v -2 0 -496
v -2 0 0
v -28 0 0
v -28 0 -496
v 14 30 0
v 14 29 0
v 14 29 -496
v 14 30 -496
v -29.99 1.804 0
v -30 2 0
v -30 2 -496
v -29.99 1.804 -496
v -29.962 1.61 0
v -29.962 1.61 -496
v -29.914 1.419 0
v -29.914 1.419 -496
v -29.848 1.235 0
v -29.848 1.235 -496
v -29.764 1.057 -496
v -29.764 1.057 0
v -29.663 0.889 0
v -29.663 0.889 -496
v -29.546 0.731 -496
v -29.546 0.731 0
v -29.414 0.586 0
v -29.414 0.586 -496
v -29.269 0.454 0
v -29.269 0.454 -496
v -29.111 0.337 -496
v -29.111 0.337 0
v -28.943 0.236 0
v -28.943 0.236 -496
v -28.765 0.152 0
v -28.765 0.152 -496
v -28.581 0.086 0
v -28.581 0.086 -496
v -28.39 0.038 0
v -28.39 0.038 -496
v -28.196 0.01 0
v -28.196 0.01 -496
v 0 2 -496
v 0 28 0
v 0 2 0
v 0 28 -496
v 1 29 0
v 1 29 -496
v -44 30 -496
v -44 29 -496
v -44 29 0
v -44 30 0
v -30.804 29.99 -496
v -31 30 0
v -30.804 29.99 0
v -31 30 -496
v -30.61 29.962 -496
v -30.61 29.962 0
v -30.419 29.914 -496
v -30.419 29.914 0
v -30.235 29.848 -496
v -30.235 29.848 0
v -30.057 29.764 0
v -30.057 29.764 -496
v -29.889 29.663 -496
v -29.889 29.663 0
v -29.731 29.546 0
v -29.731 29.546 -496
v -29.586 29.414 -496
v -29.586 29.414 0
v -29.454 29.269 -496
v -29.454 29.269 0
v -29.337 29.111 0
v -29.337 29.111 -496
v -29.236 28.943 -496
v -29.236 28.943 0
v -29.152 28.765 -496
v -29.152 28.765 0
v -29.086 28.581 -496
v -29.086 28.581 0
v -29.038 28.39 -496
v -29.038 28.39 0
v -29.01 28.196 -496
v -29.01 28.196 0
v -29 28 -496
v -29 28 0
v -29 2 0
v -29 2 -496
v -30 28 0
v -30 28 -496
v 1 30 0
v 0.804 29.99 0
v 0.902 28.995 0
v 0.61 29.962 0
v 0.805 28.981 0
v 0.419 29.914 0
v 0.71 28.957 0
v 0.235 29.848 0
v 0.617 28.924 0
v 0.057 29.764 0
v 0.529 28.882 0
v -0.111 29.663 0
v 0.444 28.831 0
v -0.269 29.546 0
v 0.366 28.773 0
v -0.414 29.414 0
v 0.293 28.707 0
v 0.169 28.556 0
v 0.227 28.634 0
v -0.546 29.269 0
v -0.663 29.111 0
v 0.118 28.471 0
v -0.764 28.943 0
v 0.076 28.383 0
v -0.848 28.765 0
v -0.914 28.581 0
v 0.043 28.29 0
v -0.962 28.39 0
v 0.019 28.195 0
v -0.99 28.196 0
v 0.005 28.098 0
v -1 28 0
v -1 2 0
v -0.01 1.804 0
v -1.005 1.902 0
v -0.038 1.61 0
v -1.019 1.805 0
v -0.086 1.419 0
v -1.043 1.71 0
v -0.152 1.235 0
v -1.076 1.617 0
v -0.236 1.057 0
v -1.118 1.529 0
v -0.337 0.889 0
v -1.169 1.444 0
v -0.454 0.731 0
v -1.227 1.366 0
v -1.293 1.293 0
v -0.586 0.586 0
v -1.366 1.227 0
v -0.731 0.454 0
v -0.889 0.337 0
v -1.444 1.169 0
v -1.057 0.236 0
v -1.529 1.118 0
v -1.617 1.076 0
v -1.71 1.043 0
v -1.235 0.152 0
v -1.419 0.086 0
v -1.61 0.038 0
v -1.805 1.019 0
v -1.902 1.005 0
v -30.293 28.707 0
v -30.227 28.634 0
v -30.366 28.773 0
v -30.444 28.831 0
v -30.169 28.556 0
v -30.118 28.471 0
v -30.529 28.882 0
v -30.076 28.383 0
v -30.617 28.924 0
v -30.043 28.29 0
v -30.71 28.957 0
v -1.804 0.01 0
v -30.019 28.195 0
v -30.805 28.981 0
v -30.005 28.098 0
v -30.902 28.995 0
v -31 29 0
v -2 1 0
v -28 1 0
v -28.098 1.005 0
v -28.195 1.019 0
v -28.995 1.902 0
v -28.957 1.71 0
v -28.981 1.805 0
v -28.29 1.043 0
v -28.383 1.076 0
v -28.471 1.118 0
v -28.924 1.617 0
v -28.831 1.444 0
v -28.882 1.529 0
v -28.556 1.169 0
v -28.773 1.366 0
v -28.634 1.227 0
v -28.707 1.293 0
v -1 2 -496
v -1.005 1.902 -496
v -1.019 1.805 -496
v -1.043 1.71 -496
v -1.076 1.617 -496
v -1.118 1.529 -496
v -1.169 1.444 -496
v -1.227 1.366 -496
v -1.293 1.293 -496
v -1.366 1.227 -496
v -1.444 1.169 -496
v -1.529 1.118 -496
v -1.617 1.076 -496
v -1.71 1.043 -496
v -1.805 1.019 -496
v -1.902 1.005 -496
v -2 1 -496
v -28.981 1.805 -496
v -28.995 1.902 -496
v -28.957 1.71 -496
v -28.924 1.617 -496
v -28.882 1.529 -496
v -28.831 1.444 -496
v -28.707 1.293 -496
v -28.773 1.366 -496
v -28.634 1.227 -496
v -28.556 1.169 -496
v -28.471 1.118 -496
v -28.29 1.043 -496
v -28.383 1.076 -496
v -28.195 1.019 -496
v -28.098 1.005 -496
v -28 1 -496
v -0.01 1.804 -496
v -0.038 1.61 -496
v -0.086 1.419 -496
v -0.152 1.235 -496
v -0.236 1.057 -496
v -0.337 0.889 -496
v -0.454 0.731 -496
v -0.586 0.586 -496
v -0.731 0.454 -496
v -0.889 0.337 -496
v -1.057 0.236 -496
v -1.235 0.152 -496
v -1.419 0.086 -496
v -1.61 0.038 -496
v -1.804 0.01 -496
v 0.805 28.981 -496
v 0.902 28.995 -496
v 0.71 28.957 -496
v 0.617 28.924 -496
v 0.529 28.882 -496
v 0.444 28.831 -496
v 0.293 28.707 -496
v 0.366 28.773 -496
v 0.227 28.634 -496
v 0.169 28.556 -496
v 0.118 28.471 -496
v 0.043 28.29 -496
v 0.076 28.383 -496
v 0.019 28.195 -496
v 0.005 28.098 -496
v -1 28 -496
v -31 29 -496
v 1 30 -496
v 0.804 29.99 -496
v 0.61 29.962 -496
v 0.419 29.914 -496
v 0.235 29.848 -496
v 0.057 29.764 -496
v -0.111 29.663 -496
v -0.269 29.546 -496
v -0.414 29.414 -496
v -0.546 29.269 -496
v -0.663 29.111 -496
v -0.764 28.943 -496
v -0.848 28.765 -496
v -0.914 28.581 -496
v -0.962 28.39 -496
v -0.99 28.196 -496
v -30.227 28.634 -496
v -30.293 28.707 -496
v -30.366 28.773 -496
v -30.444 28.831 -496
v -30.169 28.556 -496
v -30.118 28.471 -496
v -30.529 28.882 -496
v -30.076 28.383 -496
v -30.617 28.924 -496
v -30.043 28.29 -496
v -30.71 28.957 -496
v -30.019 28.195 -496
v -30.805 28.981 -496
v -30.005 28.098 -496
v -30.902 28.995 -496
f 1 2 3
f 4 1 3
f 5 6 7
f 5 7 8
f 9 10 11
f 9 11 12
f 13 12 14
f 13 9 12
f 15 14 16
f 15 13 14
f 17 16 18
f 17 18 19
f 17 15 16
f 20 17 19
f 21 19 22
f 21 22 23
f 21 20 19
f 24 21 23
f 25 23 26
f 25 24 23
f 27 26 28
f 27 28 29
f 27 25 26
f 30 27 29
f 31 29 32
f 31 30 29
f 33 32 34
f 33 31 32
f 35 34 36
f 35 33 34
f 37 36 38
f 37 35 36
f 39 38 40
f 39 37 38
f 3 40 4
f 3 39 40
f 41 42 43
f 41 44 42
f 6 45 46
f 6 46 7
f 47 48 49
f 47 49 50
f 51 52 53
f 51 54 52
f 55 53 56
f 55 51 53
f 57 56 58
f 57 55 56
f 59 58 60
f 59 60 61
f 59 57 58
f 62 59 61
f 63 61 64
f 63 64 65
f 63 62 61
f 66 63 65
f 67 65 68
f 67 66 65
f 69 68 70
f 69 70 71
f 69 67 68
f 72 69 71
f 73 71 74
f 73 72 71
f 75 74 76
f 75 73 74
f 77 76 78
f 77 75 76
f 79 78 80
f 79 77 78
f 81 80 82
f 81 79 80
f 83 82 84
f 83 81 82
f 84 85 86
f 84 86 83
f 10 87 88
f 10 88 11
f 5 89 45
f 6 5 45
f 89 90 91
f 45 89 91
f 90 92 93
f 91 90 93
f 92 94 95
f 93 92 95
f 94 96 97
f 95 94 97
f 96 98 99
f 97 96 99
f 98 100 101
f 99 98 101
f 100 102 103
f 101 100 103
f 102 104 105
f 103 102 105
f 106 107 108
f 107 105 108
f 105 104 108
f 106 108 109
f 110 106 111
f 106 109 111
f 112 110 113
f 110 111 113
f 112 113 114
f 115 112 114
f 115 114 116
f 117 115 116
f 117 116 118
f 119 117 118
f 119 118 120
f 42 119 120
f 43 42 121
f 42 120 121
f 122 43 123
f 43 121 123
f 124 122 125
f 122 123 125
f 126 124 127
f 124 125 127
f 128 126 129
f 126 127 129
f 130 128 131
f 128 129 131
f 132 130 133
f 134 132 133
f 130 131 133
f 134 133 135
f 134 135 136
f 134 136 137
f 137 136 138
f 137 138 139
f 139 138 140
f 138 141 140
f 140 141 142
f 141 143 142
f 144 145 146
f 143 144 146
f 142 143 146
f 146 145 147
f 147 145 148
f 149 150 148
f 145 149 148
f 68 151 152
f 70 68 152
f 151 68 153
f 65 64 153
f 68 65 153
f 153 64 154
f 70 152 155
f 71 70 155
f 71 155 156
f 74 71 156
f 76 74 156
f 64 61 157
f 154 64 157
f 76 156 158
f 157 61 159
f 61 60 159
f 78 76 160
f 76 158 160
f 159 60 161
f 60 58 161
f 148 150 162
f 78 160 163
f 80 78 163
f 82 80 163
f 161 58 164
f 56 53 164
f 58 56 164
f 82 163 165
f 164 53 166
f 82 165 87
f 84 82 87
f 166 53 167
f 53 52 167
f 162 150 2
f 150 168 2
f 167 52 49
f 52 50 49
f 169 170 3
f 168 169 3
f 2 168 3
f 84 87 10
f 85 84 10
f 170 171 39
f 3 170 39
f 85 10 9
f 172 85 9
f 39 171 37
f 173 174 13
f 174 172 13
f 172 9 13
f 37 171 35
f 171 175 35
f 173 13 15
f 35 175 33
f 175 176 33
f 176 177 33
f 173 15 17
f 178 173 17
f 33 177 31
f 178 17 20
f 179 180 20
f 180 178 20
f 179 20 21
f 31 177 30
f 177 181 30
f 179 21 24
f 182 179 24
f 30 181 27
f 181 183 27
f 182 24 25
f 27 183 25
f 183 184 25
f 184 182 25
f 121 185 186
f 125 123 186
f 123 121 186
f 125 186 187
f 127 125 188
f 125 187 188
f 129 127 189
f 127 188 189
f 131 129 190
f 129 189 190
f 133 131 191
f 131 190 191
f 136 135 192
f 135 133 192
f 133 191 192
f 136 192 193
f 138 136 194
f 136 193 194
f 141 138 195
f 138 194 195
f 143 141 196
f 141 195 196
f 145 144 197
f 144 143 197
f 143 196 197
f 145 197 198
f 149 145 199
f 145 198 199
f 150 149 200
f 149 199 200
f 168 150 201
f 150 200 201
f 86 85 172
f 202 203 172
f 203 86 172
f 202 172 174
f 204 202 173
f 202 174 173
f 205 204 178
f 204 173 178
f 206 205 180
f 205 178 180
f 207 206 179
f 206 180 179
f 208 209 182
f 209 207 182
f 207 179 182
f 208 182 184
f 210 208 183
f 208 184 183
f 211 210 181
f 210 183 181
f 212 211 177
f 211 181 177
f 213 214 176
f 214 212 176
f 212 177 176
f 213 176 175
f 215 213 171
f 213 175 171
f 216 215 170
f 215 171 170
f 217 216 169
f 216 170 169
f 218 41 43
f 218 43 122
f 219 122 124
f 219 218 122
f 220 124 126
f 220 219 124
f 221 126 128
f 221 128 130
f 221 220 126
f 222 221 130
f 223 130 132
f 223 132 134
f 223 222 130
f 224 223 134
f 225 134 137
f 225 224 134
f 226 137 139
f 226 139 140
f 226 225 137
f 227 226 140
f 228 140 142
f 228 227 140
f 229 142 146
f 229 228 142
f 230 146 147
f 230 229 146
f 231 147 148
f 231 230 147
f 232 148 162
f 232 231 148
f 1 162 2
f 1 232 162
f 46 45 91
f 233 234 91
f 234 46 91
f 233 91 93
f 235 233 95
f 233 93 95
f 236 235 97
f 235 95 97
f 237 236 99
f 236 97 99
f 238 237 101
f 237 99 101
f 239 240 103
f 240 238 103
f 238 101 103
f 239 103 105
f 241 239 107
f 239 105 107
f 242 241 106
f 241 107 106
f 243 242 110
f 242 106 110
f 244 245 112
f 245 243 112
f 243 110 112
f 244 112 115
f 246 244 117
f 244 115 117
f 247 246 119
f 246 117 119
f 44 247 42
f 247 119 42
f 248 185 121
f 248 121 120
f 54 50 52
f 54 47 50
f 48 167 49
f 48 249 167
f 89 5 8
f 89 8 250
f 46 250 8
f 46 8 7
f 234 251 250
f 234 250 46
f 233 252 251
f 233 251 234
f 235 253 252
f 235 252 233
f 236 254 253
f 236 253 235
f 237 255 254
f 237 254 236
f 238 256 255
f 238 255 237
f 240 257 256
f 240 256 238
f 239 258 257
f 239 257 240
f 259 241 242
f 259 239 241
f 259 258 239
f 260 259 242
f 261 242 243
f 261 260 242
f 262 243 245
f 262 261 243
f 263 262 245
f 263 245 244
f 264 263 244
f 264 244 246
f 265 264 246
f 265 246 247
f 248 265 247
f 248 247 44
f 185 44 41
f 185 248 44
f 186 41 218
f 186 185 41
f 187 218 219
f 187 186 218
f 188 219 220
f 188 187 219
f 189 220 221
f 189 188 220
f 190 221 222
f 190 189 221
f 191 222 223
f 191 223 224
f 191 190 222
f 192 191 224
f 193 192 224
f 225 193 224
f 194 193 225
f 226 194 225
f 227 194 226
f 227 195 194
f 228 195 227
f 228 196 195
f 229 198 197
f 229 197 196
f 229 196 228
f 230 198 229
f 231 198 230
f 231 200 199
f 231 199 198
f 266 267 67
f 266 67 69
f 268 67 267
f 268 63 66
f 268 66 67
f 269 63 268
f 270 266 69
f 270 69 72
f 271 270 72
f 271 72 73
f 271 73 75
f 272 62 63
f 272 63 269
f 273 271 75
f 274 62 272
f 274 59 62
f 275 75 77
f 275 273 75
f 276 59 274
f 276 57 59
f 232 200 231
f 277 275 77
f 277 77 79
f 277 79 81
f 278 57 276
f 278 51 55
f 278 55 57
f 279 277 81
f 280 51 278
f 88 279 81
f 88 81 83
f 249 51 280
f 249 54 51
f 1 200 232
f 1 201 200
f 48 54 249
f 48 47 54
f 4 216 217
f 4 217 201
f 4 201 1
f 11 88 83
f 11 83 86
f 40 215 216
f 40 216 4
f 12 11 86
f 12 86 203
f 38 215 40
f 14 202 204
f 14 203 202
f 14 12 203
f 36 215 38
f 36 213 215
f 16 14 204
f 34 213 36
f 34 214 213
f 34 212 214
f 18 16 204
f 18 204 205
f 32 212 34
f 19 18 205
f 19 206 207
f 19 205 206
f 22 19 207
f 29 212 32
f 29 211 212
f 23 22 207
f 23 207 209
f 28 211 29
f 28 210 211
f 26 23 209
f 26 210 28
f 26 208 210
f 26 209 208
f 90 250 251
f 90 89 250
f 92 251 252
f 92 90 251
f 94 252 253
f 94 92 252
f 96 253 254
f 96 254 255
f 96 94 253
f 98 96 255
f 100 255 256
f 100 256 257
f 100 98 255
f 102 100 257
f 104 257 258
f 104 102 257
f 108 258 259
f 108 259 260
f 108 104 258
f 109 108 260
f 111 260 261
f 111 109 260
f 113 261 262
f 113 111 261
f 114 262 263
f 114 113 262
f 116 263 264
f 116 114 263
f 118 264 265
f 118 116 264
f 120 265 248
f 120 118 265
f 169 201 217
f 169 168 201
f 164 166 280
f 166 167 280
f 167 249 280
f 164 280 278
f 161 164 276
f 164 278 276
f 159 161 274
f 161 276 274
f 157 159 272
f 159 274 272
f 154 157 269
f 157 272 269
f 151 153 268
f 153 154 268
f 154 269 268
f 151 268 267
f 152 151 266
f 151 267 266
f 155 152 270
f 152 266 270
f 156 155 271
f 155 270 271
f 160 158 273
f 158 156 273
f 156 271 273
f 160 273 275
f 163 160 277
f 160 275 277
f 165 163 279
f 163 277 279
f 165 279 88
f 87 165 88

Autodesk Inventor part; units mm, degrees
ref_plane "YZ Plane" through (0, 0, 0) normal (1, 0, 0) x (0, 1, 0)
ref_plane "XZ Plane" through (0, 0, 0) normal (0, 1, 0) x (-1, 0, 0)
ref_plane "XY Plane" through (0, 0, 0) normal (0, 0, 1) x (1, 0, 0)
sketch "Sketch1" plane through (0, 0, 0) normal (0, 1, 0) x (-1, 0, 0)
  line L0 (0, 0) -> (30, 0)
  line L1 (30, 0) -> (30, -496)
  line L2 (30, -496) -> (0, -496)
  line L3 (0, -496) -> (0, 0)
  dimension "d0" = 30
  dimension "d1" = 496
extrude "Plate1" add sketch "Sketch1" along normal blind 1
sketch "Sketch2" plane through (-29, 0, 0) normal (-1, 0, 0) x (0, -1, 0)
  line L0 (0, -496) -> (0, 0)
  line L1 (0, 0) -> (-30, 0)
  line L2 (-30, 0) -> (-30, -496)
  line L3 (-30, -496) -> (0, -496)
edge flange "Flange1" height 30 angle 90 thickness 1 bend radius 1 thickness toward (-1, 0, 0) relief tear relief width 1 relief depth 0.5 corner gap 1 corner form 0 edges at (-30, 1, -248) (0, 1, -248) wall of the first edge with corners at (-29, 0, -496) (-29, 0, 0) (-29, 30, 0) (-29, 30, -496)
bend "Bend1"
corner "Corner1"
sketch "Sketch3" plane through (-29, 29, -496) normal (0, 1, 0) x (-1, 0, 0)
  line L0 (0, 496) -> (0, 0)
  line L1 (0, 0) -> (15, 0)
  line L2 (15, 0) -> (15, 496)
  line L3 (15, 496) -> (0, 496)
edge flange "Flange2" height 15 angle 90 thickness 1 bend radius 1 thickness toward (0, 1, 0) relief tear relief width 1 relief depth 0.5 corner gap 1 corner form 0 edges at (-30, 30, -248) (0, 30, -248) wall of the first edge with corners at (-29, 29, 0) (-29, 29, -496) (-44, 29, -496) (-44, 29, 0)
bend "Bend2"
corner "Corner2"
equation "\"d2\" = Thickness"
equation "\"d3\" = BendReliefWidth"
equation "\"d4\" = BendReliefDepth"
equation "\"d5\" = MinimumRemnant"
equation "\"d6\" = TransitionRadius"
equation "\"d9\" = BendRadius"
equation "\"d10\" = CornerReliefSize"
equation "\"d11\" = GapSize"
equation "\"d12\" = JacobiRadiusSize"
equation "\"d13\" = BendReliefWidth"
equation "\"d14\" = BendReliefDepth"
equation "\"d15\" = MinimumRemnant"
equation "\"d16\" = TransitionRadius"
equation "\"d19\" = BendRadius"
equation "\"d20\" = CornerReliefSize"
equation "\"d21\" = GapSize"
equation "\"d22\" = JacobiRadiusSize"
equation "\"BendRadius\" = Thickness"
equation "\"BendReliefWidth\" = Thickness"
equation "\"BendReliefDepth\" = 0.5 * Thickness"
equation "\"CornerReliefSize\" = 4 * Thickness"
equation "\"MinimumRemnant\" = 2 * Thickness"
equation "\"TransitionRadius\" = BendRadius"
equation "\"JacobiRadiusSize\" = BendRadius"
equation "\"GapSize\" = Thickness"
equation "\"Thickness\" = 1"
properties part number "Stringer" material "Aluminum 6061"
